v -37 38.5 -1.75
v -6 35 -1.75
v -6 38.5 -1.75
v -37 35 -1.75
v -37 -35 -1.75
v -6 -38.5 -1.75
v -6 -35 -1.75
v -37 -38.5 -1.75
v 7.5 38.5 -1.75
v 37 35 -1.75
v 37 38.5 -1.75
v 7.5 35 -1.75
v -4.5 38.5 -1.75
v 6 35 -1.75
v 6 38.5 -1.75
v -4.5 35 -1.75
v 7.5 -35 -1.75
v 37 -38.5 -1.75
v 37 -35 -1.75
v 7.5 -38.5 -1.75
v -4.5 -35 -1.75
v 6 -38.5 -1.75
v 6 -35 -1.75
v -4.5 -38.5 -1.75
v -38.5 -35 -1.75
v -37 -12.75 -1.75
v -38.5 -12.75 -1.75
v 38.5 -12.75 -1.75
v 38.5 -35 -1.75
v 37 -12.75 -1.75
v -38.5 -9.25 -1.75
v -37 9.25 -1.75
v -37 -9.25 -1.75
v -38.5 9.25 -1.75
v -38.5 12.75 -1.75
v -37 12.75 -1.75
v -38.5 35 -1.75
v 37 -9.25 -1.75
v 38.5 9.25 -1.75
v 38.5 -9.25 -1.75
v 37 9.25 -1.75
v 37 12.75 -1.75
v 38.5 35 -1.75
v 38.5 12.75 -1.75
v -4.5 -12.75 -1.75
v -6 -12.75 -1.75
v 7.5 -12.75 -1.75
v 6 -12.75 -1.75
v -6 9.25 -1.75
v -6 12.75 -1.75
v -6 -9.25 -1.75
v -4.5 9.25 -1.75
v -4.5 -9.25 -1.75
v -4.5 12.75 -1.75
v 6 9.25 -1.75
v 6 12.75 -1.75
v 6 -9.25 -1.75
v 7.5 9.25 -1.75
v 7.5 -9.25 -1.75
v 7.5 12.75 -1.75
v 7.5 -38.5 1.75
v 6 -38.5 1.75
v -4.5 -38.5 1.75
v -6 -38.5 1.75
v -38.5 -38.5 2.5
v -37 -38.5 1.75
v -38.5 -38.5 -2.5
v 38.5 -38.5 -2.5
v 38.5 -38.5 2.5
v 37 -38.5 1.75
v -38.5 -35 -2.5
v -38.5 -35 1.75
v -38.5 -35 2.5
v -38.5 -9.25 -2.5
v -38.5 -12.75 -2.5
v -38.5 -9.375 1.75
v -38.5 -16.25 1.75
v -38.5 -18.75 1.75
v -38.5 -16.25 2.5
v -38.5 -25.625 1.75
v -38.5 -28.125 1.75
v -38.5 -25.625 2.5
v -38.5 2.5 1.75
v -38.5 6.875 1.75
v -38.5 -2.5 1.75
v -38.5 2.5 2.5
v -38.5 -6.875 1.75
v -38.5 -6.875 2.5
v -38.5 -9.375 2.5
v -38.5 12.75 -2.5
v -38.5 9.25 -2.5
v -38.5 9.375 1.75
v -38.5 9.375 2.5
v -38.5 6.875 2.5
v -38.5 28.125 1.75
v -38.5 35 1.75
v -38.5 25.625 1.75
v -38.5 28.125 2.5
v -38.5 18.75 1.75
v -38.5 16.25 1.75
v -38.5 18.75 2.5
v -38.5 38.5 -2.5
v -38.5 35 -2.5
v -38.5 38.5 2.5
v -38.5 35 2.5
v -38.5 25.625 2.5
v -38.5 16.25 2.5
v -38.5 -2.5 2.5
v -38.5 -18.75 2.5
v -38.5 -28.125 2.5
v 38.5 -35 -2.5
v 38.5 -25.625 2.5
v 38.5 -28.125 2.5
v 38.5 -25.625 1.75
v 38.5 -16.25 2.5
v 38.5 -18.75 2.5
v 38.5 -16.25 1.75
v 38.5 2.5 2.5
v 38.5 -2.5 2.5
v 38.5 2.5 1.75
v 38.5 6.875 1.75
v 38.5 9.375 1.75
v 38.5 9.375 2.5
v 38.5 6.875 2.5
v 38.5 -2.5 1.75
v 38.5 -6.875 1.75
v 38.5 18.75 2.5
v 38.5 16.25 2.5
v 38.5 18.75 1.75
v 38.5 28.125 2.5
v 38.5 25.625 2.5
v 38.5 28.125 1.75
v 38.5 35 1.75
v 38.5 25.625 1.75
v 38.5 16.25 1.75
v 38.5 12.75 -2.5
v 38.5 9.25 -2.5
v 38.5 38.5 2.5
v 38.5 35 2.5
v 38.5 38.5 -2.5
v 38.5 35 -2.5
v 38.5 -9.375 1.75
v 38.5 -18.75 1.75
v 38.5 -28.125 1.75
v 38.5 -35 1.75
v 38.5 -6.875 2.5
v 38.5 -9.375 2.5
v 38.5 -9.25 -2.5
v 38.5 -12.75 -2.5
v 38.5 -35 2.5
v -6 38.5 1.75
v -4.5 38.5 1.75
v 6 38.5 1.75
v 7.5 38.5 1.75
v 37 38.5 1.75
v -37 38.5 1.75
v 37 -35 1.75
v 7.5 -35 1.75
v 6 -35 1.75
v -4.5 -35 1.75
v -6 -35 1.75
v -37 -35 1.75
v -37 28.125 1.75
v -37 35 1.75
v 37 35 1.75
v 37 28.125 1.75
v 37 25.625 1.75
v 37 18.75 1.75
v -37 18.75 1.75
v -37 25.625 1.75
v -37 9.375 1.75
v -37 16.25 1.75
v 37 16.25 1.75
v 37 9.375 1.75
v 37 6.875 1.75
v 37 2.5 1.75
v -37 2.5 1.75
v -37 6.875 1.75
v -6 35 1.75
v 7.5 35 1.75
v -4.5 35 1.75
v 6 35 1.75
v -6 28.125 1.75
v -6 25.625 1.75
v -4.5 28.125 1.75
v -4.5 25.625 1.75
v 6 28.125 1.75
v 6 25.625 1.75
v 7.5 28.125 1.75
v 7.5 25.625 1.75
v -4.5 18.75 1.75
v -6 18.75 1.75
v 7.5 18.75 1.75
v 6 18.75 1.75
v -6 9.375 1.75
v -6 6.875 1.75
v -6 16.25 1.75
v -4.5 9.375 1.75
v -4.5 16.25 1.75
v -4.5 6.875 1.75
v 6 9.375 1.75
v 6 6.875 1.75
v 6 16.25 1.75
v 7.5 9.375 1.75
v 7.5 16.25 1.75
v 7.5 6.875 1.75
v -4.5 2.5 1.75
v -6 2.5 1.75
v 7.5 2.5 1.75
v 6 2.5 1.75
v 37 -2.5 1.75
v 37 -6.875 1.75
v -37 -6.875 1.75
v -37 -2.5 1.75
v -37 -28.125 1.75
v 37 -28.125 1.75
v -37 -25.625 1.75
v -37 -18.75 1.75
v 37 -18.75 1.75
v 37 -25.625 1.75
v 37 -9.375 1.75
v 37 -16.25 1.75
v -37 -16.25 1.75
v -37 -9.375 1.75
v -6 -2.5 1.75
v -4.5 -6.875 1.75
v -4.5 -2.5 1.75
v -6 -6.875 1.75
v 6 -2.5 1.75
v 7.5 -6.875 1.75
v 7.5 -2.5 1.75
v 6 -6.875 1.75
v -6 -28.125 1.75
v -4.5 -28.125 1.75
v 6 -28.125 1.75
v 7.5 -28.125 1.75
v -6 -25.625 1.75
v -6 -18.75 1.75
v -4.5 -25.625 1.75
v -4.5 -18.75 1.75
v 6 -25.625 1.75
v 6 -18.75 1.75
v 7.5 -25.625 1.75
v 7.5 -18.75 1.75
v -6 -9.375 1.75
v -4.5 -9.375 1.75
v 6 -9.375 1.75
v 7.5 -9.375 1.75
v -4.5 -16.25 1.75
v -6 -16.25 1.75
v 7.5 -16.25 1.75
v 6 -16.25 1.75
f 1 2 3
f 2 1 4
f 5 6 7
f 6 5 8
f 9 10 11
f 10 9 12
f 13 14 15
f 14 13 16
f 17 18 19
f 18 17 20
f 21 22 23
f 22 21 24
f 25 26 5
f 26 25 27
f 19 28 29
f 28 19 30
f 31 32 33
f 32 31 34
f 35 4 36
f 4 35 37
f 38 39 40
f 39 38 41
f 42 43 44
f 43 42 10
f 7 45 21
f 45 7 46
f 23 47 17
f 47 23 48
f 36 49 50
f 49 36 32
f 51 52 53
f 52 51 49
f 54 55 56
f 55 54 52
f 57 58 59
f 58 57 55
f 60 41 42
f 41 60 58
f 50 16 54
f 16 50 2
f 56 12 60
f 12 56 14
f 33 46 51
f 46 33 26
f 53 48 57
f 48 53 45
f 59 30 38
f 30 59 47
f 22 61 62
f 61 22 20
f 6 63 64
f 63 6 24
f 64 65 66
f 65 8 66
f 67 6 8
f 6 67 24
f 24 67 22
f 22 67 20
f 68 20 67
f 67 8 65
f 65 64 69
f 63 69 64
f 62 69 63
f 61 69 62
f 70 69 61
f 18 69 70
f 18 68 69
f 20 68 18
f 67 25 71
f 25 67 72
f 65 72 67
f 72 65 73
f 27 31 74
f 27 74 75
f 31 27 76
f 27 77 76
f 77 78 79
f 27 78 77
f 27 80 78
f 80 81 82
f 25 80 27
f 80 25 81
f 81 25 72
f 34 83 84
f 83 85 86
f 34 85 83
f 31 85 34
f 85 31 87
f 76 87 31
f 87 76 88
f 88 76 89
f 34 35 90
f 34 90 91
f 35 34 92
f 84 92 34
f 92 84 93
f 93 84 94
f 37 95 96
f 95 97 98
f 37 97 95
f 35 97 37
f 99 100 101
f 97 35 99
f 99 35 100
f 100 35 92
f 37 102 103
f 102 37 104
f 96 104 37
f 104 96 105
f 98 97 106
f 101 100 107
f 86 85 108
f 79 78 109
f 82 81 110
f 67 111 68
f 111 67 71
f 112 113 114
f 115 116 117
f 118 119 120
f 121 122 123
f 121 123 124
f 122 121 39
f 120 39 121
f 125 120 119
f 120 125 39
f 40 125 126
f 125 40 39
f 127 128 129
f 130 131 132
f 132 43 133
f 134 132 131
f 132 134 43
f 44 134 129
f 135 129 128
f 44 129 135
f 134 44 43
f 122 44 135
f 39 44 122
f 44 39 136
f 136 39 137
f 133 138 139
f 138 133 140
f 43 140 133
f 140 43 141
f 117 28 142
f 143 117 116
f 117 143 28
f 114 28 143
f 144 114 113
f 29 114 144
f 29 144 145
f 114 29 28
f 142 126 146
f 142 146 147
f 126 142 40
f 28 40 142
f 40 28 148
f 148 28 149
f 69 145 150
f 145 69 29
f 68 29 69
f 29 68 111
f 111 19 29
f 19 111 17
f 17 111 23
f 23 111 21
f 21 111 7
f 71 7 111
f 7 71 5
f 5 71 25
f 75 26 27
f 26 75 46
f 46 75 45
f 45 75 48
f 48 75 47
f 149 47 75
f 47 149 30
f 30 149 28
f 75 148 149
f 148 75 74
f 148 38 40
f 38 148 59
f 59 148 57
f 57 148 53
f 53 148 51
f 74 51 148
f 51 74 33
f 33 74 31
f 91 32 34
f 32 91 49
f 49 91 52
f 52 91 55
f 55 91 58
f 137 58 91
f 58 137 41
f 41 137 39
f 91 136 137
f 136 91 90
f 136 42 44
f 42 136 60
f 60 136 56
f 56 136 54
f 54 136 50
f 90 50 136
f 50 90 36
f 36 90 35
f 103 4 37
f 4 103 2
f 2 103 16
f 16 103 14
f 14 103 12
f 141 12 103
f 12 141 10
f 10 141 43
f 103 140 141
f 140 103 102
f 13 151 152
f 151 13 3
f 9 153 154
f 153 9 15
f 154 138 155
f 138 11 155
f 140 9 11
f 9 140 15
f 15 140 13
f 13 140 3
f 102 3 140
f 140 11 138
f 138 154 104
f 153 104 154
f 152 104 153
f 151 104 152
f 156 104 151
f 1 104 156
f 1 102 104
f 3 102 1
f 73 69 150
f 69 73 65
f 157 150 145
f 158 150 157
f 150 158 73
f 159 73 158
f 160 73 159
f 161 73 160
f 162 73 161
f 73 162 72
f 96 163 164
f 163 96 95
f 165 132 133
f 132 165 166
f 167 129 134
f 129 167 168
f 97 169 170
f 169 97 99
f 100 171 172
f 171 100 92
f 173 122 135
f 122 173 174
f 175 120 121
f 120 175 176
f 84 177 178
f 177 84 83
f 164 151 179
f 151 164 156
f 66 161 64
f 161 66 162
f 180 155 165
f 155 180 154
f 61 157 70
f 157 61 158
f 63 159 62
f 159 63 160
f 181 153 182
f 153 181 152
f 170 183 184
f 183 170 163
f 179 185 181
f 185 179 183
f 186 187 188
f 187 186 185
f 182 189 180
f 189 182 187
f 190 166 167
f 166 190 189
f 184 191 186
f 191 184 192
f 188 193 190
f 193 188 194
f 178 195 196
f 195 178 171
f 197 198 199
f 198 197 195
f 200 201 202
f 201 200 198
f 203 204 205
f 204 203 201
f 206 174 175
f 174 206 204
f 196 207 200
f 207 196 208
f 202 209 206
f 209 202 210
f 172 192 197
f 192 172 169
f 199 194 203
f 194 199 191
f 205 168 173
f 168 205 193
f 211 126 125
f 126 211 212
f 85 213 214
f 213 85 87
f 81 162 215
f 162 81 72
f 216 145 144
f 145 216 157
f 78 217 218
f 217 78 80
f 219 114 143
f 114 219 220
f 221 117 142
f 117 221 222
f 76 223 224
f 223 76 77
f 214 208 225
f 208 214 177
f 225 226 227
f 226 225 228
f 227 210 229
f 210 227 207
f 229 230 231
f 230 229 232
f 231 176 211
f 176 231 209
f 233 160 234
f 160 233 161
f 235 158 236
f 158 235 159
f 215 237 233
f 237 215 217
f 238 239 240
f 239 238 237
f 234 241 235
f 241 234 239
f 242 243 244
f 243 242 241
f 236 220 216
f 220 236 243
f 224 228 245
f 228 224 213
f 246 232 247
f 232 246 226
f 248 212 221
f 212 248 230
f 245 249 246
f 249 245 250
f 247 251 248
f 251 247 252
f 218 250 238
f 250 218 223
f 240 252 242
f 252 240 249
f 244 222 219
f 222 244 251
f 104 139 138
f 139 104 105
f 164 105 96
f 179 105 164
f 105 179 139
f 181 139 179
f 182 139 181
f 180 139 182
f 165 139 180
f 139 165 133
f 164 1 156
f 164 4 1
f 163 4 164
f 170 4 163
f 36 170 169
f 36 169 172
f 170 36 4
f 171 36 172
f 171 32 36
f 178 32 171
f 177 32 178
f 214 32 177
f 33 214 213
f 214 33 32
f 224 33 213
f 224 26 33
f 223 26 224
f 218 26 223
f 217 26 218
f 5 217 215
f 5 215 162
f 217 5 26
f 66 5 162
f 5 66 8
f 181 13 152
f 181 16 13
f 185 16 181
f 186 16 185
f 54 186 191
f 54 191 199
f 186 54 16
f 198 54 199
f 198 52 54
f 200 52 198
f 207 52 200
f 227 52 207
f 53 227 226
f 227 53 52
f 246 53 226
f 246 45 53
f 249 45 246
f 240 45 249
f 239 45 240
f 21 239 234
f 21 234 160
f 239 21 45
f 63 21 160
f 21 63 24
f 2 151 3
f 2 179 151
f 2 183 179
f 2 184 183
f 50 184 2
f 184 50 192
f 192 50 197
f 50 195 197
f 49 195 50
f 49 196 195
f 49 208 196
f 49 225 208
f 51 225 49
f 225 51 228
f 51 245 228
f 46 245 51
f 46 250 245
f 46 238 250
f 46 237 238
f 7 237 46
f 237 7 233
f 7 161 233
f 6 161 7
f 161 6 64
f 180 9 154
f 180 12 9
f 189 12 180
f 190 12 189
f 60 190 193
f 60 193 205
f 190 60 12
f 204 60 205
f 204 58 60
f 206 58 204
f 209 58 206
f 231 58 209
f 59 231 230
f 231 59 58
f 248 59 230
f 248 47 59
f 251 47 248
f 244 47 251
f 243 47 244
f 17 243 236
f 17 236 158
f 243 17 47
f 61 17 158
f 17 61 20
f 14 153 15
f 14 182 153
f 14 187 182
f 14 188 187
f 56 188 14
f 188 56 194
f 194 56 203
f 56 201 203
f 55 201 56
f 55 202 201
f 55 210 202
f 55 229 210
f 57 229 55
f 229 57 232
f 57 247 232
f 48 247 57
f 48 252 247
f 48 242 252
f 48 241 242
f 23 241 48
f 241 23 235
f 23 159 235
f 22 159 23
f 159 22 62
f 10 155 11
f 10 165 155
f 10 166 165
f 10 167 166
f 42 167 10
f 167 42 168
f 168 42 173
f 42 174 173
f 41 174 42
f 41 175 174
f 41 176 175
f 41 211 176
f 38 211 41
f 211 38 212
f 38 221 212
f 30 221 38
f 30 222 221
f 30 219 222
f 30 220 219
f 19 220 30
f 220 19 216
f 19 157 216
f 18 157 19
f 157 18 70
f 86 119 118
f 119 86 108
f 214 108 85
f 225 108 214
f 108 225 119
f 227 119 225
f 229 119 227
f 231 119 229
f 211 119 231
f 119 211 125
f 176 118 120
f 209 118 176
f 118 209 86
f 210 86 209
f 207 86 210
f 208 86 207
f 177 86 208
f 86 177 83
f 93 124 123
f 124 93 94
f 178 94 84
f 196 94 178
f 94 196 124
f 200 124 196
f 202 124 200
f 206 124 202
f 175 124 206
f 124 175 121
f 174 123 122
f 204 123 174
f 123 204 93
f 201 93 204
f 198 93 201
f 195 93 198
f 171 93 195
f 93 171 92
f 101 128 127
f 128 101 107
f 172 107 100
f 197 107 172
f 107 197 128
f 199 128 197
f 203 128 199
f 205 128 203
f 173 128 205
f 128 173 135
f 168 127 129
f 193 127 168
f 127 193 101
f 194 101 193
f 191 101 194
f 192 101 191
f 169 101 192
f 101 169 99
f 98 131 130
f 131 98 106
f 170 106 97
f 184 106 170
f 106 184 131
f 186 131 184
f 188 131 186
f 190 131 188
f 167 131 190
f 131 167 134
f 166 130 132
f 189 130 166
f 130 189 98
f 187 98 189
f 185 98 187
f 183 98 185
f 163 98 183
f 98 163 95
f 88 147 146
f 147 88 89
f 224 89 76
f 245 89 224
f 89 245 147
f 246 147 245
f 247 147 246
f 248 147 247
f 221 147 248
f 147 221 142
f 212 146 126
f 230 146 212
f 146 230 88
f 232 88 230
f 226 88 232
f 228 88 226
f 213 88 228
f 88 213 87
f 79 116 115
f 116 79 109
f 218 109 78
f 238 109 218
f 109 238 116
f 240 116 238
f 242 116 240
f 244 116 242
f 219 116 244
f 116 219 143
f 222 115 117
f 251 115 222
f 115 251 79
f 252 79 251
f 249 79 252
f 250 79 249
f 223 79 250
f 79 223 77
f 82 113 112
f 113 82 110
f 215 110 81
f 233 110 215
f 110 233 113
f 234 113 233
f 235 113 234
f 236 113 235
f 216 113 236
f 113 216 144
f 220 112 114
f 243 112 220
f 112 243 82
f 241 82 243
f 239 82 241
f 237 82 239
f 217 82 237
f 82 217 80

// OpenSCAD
// file: materials.scad
// General Materials List for part Dimmentions
//  These form the matrial requirements for Deseret Manufacturing's homemade pallets

// Define Rails as 2x4 boards
Rails_W = 3.5; // 4
Rails_T = 1.5; // 2

// Define Frames as 1x4 boards
Frame_W = 3.5; // 4
Frame_T = 0.75; // 1

// Define Ties as 1x3 boards
Tie_W = 2.5; // 3
Tie_T = Frame_T; // same thickness as Frames

// These are the real sizes of the board and are used in calulations and rendering
// file: Pallet.scad
// Generic Pallet Module

include <materials.scad>

module Pallet(length, width, center) {
	// Define parts
	Rails = [Rails_W, length, Rails_T];
	Frame = [Frame_W, width, Frame_T];
	Tie = [Tie_W, width, Frame_T];

	// Place Foundation
	//  The end-to-end constant 29.25 is used because in the pallets I have made I can find no edge-cases that would need to alter it and I lack sufficient data on pallet jacks to automaticly place them.
	foundation_pos = [0, 29.25 - Frame_W, length - 29.25, length - Frame_W];

	for( pos = foundation_pos ) {
		rotate([0,0,90]) translate([pos - length / 2, - width / 2, - (Rails_W / 2) - Frame_T]) cube(Frame);
	}

	for( pos = [0, length - Frame_W] ) {
		rotate([0,0,90]) translate([pos - length / 2, - width / 2, Rails_W /2]) cube(Frame);
	}

	// Place Rails
	//  The end-to-end constant for the space between the two middle rails is 13.5
	//  Again I lack sufficient data on pallet jacks to automaticly place them.
	
	rail_spaces = (width - 13.5 + Rails_T) / 2;

	rail_pos = [0, rail_spaces, width - rail_spaces, width - Rails_T];

	for( pos = rail_pos ) {
		translate([pos - width /2 , -length /2 ,Rails_W /2]) rotate([0,90,0]) cube(Rails);
	}

	// Place Ties
	//  Ties form the main face of the pallet
   //  In this design, a centeral cluster of ties is used to reinforce the middle of the pallet
	pallet_center = length / 2;
	cluster_center = (center * Tie_W) / 2 + Tie_W;
	function cluster_pos_gen(ittr) = pallet_center - cluster_center + (ittr * Tie_W);
	cluster_pos = [ for(i=[1:center]) cluster_pos_gen(i) ];
    for( pos = cluster_pos ){
        rotate([0,0,90]) translate([pos - length / 2, - width / 2, Rails_W /2]) cube(Tie);
    }
    
    target_space = 8;
    tie_count = ceil((length - ( center * Tie_W + 2 * ( Frame_W + target_space ))) / (Tie_W + target_space ) / 2) * 2;
    tie_space = (length - ( center * Tie_W + 2 * Frame_W + tie_count * Tie_W )) / (tie_count + 2);
    echo(tie_count);
    echo(tie_space);
    for(i = [0:tie_count / 2 - 1] ) {
        rotate([0,0,90]) translate([i * (tie_space + Tie_W) + (center * Tie_W) / 2 + tie_space, - width / 2, Rails_W /2]) cube(Tie);
    }
     for(i = [0:tie_count / 2 - 1] ) {
        rotate([0,0,90]) translate([-(i * (tie_space + Tie_W) + (center * Tie_W) / 2 + tie_space) - Tie_W, - width / 2, Rails_W /2]) cube(Tie);
    }
}
// main file
// Implimentation of full sized pallets (designed to fit a full sized mattress).

use <Pallet.scad>

Pallet_L = 77;
Pallet_W = 77;
Center = 0;

Pallet(Pallet_L, Pallet_W, Center);
